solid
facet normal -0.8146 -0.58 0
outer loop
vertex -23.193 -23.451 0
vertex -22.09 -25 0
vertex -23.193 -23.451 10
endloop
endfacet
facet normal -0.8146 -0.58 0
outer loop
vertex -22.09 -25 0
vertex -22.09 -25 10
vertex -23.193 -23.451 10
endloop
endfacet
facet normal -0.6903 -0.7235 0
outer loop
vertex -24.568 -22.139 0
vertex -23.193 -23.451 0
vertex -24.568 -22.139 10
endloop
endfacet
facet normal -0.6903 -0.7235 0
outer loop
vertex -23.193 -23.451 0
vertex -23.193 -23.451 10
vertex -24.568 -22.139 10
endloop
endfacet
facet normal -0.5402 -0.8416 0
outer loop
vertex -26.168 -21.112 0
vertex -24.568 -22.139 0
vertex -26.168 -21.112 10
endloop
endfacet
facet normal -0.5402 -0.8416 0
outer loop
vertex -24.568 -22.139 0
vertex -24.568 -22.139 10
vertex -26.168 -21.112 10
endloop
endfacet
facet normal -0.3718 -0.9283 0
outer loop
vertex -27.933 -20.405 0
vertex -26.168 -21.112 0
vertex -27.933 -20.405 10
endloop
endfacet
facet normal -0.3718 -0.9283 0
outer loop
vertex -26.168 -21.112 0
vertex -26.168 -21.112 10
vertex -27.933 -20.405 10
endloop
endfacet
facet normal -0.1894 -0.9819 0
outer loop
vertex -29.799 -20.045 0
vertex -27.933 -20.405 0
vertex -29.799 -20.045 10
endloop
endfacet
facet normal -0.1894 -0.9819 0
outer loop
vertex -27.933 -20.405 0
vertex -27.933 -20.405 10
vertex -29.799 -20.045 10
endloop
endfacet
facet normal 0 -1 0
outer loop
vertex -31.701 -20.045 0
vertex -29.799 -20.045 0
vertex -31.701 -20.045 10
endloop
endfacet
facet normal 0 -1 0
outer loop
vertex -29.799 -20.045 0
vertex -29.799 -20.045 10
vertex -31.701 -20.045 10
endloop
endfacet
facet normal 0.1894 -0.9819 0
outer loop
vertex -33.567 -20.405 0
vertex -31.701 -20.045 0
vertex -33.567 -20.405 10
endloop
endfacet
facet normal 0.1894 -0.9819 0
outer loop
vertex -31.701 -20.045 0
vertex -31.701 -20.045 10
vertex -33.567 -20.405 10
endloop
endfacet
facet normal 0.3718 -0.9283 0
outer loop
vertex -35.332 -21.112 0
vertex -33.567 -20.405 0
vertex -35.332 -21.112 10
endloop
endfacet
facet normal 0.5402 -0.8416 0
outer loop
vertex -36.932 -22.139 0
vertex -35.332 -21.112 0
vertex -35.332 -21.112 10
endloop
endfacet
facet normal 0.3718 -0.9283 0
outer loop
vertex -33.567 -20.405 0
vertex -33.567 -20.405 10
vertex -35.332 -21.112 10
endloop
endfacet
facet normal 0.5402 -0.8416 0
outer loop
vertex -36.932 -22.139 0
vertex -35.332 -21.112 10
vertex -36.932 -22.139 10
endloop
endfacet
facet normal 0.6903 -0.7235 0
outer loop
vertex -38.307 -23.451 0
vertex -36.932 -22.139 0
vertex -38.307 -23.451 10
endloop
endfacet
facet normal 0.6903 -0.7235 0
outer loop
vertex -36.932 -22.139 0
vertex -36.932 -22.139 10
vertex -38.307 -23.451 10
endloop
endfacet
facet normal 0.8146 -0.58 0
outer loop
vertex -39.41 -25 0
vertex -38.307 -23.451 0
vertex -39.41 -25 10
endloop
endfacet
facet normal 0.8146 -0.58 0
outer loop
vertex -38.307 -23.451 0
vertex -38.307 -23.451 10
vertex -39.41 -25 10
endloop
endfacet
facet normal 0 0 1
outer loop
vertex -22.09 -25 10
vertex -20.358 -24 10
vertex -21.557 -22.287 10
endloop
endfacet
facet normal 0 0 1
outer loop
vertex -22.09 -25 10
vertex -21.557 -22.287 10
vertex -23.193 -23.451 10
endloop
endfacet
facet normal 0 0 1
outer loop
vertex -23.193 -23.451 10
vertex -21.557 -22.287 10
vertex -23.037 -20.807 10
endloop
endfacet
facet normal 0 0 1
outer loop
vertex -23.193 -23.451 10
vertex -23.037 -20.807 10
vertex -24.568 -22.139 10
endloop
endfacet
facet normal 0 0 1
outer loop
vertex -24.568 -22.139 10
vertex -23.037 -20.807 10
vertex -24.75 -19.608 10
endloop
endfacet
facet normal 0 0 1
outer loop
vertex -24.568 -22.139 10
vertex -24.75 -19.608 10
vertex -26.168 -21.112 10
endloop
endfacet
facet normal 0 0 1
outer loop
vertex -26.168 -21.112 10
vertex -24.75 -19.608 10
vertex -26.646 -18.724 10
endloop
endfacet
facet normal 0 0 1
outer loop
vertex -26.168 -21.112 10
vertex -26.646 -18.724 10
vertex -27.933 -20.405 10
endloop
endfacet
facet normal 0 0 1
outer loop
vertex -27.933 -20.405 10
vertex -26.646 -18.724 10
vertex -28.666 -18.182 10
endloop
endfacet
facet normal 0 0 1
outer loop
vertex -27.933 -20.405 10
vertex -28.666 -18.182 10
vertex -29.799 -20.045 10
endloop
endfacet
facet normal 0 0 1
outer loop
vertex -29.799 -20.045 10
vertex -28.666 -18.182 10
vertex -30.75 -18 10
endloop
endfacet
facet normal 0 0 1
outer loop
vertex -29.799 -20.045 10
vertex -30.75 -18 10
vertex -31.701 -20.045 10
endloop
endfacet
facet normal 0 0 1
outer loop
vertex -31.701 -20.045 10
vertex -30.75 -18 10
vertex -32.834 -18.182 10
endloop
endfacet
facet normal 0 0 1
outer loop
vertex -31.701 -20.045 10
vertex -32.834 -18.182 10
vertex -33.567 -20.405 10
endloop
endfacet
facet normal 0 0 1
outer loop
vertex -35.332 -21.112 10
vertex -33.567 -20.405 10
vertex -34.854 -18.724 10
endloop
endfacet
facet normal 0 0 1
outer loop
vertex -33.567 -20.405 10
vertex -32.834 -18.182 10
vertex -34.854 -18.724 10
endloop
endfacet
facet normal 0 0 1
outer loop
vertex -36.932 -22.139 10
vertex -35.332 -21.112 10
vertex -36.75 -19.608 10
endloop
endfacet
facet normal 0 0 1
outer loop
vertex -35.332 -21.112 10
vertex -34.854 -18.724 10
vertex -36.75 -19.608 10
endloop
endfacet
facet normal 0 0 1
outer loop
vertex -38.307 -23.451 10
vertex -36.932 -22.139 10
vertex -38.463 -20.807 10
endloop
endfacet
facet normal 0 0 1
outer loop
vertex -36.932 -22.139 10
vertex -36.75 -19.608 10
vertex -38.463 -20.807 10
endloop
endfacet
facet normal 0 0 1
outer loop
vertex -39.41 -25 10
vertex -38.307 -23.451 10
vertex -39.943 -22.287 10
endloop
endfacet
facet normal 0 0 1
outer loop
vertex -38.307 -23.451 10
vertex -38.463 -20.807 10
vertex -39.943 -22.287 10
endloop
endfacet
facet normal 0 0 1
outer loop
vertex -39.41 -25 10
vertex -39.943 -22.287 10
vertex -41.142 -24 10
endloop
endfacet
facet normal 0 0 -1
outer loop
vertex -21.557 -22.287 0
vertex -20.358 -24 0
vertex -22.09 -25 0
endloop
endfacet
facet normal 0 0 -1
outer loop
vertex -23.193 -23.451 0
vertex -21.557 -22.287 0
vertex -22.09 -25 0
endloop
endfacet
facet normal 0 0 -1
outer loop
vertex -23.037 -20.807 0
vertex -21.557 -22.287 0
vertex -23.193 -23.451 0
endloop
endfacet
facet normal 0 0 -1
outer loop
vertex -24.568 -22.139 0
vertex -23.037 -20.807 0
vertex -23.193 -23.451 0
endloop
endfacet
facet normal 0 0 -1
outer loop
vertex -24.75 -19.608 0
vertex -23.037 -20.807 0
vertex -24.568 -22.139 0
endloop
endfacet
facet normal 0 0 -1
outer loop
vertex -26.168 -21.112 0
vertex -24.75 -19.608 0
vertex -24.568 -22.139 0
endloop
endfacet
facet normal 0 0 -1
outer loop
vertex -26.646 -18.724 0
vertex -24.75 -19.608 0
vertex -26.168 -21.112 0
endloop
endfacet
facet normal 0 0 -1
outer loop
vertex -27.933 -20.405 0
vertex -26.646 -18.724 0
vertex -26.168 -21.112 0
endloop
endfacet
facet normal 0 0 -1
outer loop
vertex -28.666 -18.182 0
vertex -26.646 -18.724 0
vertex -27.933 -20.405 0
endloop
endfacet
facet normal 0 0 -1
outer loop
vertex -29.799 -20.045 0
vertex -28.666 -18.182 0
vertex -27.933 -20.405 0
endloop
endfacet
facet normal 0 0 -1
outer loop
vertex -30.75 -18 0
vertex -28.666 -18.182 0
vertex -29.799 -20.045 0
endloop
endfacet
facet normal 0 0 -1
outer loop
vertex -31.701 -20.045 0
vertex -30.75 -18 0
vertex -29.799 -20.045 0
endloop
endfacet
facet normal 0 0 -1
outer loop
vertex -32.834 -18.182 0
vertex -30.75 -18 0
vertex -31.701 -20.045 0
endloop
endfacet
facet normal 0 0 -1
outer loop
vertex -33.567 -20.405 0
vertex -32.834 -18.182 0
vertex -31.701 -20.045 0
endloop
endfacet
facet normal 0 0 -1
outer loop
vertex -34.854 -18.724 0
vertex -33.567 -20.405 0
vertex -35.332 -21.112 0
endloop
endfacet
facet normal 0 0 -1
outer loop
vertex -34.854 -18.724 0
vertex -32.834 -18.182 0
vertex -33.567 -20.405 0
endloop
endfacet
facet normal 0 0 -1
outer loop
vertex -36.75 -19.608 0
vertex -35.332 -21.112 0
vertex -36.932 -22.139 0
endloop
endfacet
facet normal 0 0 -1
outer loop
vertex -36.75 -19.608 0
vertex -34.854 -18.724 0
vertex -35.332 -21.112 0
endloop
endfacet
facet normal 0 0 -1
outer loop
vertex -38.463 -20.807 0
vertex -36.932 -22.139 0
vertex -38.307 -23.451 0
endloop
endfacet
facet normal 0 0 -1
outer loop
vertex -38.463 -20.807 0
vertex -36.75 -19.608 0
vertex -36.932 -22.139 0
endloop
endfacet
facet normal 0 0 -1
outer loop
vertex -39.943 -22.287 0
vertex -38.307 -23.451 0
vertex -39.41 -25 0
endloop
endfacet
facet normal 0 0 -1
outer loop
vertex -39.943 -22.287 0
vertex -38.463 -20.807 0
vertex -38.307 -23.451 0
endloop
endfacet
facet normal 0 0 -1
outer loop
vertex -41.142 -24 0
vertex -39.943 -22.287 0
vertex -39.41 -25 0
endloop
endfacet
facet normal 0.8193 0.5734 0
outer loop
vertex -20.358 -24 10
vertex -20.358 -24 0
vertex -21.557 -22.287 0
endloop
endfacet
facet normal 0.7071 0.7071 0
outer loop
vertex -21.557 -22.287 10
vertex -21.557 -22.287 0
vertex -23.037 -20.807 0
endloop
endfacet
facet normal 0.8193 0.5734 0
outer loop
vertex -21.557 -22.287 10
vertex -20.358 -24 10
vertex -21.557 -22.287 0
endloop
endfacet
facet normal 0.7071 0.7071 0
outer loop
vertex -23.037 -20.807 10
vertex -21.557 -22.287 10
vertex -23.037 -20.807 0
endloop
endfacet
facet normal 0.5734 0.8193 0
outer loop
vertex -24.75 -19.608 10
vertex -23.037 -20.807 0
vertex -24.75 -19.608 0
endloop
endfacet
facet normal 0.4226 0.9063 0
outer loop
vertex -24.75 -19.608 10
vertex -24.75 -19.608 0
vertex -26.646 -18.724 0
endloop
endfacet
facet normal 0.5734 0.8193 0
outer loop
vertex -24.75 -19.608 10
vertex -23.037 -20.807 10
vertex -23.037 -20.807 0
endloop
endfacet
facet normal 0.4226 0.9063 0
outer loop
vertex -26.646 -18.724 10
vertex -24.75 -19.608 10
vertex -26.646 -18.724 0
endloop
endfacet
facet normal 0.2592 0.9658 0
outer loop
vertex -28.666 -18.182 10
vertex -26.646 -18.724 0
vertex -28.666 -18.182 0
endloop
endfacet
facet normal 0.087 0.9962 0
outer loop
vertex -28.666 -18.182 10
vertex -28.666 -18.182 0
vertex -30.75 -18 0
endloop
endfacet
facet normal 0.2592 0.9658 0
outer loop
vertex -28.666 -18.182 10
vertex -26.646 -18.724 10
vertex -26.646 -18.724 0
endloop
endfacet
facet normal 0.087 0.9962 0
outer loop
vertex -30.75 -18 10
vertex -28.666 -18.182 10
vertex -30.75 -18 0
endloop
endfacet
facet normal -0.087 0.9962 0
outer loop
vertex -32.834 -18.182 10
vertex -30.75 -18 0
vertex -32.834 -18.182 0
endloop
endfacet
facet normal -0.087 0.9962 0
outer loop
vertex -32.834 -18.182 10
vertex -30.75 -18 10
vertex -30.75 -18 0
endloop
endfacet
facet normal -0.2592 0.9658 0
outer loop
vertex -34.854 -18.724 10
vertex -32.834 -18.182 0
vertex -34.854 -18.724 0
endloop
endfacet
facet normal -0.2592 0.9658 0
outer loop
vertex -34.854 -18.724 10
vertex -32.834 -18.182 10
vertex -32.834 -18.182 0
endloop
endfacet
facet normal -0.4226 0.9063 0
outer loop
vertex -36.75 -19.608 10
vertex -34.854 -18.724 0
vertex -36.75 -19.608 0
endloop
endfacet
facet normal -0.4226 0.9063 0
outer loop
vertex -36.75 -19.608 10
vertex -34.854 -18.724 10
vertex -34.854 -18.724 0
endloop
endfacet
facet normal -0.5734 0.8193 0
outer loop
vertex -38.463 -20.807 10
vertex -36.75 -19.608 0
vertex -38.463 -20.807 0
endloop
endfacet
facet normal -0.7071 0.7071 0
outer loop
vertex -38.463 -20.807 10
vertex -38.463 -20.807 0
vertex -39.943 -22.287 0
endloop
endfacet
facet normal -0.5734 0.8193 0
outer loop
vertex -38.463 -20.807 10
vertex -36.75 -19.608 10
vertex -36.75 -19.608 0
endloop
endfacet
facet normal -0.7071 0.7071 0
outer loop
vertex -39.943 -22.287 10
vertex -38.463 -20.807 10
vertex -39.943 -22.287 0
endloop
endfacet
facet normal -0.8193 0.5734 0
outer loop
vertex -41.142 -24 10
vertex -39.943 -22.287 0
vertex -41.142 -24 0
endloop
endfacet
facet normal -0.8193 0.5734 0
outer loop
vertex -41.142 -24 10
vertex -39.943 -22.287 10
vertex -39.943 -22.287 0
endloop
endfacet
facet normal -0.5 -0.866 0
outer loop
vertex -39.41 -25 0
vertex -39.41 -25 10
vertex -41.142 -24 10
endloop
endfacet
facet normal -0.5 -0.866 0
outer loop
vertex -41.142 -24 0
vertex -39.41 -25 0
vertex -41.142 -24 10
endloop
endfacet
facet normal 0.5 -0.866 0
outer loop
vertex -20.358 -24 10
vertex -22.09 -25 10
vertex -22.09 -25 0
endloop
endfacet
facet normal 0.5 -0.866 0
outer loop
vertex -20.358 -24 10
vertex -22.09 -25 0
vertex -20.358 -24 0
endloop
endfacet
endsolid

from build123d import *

# Parameters (mm, degrees)
CYLINDER019_W               = 10
CYLINDER019_H               = 10
CYLINDER019_ANGLE           = 120
CYLINDER019_PLACEMENT_ANGLE = 30
CYLINDER017_W               = 12
CYLINDER017_H               = 10
CYLINDER017_ANGLE           = 120
CYLINDER017_PLACEMENT_ANGLE = 30


with BuildPart() as cilindro010:
    # Cylinder019 → Cylinder019 (revolve)
    with BuildSketch(Plane.XZ):
        with Locations((5, 5)):
            Rectangle(CYLINDER019_W, CYLINDER019_H)
    revolve(axis=Axis((0, 0, 0), (0, 0, 1)), revolution_arc=CYLINDER019_ANGLE)


with BuildPart() as cilindro010_1:
    # Cylinder019 placement: moved
    add(cilindro010.part.moved(Location((-30.75, -30, 0))).rotate(Axis((-30.75, -30, 0), (0, 0, 1)), CYLINDER019_PLACEMENT_ANGLE))


with BuildPart() as inalambrico_grande001:
    # Cylinder017 → Cylinder017 (revolve)
    with BuildSketch(Plane.XZ):
        with Locations((6, 5)):
            Rectangle(CYLINDER017_W, CYLINDER017_H)
    revolve(axis=Axis((0, 0, 0), (0, 0, 1)), revolution_arc=CYLINDER017_ANGLE)


with BuildPart() as inalambrico_grande001_1:
    # Cylinder017 placement: moved
    add(inalambrico_grande001.part.moved(Location((-30.75, -30, 0))).rotate(Axis((-30.75, -30, 0), (0, 0, 1)), CYLINDER017_PLACEMENT_ANGLE))

    # Cut006: cut Cilindro010
    add(cilindro010_1.part, mode=Mode.SUBTRACT)


solid = inalambrico_grande001_1.part
